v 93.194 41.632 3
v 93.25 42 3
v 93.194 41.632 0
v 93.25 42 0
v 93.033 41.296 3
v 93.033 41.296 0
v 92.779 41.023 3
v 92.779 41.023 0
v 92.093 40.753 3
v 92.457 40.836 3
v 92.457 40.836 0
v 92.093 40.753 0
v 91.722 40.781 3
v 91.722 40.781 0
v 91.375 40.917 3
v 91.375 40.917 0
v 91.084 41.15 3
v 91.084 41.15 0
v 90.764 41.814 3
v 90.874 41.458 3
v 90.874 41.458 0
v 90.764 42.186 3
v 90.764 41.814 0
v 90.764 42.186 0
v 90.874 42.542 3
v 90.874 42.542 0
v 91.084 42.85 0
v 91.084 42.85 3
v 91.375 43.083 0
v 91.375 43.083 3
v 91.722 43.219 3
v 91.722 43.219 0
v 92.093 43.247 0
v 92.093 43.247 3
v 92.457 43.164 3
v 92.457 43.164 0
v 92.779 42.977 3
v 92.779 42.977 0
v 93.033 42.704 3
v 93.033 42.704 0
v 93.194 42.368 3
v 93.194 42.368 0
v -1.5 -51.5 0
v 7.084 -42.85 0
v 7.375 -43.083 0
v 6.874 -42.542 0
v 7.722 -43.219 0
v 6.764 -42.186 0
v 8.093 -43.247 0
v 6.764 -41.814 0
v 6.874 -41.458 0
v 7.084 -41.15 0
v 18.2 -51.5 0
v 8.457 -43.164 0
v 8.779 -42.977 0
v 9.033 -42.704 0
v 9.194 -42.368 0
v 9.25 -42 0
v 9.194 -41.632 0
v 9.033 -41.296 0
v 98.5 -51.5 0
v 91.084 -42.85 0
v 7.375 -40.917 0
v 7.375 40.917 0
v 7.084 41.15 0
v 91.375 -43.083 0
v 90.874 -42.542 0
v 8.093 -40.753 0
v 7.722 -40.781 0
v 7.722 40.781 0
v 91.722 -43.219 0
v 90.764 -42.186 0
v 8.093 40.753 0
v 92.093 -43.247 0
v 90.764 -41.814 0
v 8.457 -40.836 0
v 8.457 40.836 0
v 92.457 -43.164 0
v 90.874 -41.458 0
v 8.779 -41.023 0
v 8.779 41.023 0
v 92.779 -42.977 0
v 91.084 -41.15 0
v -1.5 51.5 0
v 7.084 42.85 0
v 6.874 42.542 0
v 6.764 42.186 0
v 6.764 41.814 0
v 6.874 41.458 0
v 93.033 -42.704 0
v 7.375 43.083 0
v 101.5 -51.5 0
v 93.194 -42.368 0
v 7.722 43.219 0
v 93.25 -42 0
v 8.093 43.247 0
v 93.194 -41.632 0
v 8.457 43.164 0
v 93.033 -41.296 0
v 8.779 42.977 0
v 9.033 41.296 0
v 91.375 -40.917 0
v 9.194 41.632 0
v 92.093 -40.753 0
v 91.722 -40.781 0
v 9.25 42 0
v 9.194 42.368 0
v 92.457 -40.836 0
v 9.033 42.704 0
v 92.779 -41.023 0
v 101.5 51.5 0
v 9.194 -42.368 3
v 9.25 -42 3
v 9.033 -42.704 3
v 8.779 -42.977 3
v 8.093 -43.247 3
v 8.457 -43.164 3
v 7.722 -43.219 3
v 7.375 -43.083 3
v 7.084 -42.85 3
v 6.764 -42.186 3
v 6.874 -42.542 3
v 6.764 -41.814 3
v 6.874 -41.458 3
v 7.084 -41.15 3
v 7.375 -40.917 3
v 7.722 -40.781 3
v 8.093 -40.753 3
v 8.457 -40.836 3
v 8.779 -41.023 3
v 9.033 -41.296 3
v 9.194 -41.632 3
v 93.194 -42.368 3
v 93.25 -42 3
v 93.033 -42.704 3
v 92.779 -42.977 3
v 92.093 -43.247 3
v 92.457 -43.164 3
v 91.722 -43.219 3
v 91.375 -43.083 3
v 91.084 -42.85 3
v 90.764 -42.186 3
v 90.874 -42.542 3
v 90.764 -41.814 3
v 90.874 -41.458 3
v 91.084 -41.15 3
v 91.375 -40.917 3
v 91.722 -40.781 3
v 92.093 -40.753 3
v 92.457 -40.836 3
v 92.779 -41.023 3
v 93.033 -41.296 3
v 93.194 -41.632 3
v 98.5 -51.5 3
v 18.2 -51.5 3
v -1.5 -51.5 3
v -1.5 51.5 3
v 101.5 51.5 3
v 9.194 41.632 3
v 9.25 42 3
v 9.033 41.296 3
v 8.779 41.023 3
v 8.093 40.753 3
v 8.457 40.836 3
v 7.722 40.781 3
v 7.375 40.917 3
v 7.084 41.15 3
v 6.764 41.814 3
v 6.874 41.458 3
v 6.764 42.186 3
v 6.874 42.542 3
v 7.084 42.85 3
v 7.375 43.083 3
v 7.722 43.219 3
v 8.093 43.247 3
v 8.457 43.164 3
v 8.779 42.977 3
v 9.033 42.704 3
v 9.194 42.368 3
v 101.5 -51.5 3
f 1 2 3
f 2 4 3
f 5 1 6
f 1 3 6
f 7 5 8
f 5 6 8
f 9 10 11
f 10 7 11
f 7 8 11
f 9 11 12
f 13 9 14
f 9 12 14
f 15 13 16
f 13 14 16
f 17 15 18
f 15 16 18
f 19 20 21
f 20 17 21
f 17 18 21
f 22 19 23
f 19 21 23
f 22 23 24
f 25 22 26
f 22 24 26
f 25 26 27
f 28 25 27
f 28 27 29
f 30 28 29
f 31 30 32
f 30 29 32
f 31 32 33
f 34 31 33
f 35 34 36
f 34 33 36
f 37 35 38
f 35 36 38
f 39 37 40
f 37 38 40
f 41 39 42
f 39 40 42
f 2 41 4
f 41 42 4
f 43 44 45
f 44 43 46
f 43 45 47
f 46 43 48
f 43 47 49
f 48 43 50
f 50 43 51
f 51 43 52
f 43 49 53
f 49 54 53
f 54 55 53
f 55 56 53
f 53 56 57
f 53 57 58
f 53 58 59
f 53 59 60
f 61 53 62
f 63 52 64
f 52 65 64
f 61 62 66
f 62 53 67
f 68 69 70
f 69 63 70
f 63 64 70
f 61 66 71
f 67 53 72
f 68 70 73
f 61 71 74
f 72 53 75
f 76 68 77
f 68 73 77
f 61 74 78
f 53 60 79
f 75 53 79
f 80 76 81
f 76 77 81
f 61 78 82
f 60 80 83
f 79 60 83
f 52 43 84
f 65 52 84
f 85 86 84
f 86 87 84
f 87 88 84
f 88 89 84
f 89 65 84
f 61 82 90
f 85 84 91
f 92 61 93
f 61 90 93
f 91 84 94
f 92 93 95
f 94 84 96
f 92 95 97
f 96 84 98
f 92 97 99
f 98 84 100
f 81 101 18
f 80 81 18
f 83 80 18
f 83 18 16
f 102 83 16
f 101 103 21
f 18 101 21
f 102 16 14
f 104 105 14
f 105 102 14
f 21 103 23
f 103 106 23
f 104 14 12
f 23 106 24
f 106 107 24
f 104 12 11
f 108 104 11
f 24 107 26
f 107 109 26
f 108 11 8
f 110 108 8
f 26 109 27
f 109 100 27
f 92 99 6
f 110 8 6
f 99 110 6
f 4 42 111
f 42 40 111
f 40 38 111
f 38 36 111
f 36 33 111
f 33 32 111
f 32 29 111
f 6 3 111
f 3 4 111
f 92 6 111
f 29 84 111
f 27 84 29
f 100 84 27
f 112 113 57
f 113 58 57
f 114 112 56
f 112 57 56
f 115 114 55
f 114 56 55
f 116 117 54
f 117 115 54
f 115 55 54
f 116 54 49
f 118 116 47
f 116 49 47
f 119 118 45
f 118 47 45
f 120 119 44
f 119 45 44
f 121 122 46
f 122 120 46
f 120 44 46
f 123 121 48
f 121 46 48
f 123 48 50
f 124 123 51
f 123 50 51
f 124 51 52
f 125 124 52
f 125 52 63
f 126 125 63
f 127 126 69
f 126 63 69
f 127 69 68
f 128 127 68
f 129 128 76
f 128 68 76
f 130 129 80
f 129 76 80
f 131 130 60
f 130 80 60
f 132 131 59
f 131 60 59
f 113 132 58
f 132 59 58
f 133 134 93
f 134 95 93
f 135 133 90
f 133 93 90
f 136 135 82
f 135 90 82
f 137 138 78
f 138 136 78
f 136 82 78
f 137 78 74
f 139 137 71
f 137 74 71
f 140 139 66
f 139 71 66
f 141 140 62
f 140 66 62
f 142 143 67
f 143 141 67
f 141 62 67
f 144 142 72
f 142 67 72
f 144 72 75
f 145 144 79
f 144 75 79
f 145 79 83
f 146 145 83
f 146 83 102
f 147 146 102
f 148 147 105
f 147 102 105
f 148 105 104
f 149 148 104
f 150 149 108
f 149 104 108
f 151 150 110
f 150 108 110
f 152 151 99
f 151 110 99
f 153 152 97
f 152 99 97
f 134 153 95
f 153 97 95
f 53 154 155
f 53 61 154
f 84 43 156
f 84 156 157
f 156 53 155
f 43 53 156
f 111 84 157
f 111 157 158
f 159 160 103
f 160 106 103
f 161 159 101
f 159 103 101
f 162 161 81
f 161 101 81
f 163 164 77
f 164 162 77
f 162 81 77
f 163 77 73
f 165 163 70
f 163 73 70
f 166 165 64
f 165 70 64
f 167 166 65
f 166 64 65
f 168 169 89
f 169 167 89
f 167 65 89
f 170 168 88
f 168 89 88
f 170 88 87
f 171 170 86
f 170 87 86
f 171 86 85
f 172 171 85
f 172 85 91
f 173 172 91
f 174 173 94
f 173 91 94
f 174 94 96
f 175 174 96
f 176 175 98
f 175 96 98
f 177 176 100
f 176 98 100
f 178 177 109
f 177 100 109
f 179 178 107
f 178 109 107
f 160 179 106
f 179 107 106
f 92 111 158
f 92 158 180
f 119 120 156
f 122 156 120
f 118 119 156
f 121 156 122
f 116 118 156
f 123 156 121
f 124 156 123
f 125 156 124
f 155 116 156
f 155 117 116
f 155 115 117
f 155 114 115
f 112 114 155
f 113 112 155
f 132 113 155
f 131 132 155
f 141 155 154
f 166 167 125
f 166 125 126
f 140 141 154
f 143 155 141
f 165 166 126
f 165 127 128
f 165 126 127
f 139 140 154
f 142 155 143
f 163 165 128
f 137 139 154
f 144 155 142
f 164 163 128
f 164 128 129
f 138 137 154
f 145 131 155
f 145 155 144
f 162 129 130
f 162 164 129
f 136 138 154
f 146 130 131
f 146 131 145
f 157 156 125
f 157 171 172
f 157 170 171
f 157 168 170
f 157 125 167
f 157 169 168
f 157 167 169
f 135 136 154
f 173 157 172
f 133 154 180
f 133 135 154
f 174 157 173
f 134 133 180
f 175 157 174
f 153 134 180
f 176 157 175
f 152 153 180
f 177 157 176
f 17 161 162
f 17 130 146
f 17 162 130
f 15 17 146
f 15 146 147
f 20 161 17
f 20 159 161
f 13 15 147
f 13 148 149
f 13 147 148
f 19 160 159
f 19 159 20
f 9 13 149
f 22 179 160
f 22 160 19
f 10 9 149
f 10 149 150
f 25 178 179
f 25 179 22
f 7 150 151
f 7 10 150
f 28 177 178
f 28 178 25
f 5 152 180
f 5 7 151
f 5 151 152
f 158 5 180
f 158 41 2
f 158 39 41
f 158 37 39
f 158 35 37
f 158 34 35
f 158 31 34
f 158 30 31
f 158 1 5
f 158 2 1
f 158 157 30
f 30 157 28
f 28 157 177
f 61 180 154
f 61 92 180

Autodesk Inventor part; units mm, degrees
ref_plane "YZ Plane" through (0, 0, 0) normal (1, 0, 0) x (0, 1, 0)
ref_plane "XZ Plane" through (0, 0, 0) normal (0, 1, 0) x (-1, 0, 0)
ref_plane "XY Plane" through (0, 0, 0) normal (0, 0, 1) x (1, 0, 0)
sketch "Boceto1" plane through (0, 0, 0) normal (0, 0, 1) x (1, 0, 0)
  line L0 (-1.5, -51.5) -> (-1.5, 51.5)
  line L1 (98.5, -51.5) -> (18.2, -51.5)
  line L2 (101.5, 51.5) -> (101.5, -51.5)
  line L3 (101.5, -51.5) -> (-1.5, -51.5)
  line L4 (-1.5, -51.5) -> (-1.5, 51.5)
  line L5 (-1.5, 51.5) -> (101.5, 51.5)
  line L6 (101.5, 51.5) -> (101.5, -51.5)
  circle A0 centre (8, -42) radius 1.25
  circle A1 centre (8, 42) radius 1.25
  circle A2 centre (92, 42) radius 1.25
  circle A3 centre (92, -42) radius 1.25
  point P0 (0, 0)
extrude "Extrusión1" add sketch "Boceto1" along normal blind 3
properties part number "Tapa_abajo"
